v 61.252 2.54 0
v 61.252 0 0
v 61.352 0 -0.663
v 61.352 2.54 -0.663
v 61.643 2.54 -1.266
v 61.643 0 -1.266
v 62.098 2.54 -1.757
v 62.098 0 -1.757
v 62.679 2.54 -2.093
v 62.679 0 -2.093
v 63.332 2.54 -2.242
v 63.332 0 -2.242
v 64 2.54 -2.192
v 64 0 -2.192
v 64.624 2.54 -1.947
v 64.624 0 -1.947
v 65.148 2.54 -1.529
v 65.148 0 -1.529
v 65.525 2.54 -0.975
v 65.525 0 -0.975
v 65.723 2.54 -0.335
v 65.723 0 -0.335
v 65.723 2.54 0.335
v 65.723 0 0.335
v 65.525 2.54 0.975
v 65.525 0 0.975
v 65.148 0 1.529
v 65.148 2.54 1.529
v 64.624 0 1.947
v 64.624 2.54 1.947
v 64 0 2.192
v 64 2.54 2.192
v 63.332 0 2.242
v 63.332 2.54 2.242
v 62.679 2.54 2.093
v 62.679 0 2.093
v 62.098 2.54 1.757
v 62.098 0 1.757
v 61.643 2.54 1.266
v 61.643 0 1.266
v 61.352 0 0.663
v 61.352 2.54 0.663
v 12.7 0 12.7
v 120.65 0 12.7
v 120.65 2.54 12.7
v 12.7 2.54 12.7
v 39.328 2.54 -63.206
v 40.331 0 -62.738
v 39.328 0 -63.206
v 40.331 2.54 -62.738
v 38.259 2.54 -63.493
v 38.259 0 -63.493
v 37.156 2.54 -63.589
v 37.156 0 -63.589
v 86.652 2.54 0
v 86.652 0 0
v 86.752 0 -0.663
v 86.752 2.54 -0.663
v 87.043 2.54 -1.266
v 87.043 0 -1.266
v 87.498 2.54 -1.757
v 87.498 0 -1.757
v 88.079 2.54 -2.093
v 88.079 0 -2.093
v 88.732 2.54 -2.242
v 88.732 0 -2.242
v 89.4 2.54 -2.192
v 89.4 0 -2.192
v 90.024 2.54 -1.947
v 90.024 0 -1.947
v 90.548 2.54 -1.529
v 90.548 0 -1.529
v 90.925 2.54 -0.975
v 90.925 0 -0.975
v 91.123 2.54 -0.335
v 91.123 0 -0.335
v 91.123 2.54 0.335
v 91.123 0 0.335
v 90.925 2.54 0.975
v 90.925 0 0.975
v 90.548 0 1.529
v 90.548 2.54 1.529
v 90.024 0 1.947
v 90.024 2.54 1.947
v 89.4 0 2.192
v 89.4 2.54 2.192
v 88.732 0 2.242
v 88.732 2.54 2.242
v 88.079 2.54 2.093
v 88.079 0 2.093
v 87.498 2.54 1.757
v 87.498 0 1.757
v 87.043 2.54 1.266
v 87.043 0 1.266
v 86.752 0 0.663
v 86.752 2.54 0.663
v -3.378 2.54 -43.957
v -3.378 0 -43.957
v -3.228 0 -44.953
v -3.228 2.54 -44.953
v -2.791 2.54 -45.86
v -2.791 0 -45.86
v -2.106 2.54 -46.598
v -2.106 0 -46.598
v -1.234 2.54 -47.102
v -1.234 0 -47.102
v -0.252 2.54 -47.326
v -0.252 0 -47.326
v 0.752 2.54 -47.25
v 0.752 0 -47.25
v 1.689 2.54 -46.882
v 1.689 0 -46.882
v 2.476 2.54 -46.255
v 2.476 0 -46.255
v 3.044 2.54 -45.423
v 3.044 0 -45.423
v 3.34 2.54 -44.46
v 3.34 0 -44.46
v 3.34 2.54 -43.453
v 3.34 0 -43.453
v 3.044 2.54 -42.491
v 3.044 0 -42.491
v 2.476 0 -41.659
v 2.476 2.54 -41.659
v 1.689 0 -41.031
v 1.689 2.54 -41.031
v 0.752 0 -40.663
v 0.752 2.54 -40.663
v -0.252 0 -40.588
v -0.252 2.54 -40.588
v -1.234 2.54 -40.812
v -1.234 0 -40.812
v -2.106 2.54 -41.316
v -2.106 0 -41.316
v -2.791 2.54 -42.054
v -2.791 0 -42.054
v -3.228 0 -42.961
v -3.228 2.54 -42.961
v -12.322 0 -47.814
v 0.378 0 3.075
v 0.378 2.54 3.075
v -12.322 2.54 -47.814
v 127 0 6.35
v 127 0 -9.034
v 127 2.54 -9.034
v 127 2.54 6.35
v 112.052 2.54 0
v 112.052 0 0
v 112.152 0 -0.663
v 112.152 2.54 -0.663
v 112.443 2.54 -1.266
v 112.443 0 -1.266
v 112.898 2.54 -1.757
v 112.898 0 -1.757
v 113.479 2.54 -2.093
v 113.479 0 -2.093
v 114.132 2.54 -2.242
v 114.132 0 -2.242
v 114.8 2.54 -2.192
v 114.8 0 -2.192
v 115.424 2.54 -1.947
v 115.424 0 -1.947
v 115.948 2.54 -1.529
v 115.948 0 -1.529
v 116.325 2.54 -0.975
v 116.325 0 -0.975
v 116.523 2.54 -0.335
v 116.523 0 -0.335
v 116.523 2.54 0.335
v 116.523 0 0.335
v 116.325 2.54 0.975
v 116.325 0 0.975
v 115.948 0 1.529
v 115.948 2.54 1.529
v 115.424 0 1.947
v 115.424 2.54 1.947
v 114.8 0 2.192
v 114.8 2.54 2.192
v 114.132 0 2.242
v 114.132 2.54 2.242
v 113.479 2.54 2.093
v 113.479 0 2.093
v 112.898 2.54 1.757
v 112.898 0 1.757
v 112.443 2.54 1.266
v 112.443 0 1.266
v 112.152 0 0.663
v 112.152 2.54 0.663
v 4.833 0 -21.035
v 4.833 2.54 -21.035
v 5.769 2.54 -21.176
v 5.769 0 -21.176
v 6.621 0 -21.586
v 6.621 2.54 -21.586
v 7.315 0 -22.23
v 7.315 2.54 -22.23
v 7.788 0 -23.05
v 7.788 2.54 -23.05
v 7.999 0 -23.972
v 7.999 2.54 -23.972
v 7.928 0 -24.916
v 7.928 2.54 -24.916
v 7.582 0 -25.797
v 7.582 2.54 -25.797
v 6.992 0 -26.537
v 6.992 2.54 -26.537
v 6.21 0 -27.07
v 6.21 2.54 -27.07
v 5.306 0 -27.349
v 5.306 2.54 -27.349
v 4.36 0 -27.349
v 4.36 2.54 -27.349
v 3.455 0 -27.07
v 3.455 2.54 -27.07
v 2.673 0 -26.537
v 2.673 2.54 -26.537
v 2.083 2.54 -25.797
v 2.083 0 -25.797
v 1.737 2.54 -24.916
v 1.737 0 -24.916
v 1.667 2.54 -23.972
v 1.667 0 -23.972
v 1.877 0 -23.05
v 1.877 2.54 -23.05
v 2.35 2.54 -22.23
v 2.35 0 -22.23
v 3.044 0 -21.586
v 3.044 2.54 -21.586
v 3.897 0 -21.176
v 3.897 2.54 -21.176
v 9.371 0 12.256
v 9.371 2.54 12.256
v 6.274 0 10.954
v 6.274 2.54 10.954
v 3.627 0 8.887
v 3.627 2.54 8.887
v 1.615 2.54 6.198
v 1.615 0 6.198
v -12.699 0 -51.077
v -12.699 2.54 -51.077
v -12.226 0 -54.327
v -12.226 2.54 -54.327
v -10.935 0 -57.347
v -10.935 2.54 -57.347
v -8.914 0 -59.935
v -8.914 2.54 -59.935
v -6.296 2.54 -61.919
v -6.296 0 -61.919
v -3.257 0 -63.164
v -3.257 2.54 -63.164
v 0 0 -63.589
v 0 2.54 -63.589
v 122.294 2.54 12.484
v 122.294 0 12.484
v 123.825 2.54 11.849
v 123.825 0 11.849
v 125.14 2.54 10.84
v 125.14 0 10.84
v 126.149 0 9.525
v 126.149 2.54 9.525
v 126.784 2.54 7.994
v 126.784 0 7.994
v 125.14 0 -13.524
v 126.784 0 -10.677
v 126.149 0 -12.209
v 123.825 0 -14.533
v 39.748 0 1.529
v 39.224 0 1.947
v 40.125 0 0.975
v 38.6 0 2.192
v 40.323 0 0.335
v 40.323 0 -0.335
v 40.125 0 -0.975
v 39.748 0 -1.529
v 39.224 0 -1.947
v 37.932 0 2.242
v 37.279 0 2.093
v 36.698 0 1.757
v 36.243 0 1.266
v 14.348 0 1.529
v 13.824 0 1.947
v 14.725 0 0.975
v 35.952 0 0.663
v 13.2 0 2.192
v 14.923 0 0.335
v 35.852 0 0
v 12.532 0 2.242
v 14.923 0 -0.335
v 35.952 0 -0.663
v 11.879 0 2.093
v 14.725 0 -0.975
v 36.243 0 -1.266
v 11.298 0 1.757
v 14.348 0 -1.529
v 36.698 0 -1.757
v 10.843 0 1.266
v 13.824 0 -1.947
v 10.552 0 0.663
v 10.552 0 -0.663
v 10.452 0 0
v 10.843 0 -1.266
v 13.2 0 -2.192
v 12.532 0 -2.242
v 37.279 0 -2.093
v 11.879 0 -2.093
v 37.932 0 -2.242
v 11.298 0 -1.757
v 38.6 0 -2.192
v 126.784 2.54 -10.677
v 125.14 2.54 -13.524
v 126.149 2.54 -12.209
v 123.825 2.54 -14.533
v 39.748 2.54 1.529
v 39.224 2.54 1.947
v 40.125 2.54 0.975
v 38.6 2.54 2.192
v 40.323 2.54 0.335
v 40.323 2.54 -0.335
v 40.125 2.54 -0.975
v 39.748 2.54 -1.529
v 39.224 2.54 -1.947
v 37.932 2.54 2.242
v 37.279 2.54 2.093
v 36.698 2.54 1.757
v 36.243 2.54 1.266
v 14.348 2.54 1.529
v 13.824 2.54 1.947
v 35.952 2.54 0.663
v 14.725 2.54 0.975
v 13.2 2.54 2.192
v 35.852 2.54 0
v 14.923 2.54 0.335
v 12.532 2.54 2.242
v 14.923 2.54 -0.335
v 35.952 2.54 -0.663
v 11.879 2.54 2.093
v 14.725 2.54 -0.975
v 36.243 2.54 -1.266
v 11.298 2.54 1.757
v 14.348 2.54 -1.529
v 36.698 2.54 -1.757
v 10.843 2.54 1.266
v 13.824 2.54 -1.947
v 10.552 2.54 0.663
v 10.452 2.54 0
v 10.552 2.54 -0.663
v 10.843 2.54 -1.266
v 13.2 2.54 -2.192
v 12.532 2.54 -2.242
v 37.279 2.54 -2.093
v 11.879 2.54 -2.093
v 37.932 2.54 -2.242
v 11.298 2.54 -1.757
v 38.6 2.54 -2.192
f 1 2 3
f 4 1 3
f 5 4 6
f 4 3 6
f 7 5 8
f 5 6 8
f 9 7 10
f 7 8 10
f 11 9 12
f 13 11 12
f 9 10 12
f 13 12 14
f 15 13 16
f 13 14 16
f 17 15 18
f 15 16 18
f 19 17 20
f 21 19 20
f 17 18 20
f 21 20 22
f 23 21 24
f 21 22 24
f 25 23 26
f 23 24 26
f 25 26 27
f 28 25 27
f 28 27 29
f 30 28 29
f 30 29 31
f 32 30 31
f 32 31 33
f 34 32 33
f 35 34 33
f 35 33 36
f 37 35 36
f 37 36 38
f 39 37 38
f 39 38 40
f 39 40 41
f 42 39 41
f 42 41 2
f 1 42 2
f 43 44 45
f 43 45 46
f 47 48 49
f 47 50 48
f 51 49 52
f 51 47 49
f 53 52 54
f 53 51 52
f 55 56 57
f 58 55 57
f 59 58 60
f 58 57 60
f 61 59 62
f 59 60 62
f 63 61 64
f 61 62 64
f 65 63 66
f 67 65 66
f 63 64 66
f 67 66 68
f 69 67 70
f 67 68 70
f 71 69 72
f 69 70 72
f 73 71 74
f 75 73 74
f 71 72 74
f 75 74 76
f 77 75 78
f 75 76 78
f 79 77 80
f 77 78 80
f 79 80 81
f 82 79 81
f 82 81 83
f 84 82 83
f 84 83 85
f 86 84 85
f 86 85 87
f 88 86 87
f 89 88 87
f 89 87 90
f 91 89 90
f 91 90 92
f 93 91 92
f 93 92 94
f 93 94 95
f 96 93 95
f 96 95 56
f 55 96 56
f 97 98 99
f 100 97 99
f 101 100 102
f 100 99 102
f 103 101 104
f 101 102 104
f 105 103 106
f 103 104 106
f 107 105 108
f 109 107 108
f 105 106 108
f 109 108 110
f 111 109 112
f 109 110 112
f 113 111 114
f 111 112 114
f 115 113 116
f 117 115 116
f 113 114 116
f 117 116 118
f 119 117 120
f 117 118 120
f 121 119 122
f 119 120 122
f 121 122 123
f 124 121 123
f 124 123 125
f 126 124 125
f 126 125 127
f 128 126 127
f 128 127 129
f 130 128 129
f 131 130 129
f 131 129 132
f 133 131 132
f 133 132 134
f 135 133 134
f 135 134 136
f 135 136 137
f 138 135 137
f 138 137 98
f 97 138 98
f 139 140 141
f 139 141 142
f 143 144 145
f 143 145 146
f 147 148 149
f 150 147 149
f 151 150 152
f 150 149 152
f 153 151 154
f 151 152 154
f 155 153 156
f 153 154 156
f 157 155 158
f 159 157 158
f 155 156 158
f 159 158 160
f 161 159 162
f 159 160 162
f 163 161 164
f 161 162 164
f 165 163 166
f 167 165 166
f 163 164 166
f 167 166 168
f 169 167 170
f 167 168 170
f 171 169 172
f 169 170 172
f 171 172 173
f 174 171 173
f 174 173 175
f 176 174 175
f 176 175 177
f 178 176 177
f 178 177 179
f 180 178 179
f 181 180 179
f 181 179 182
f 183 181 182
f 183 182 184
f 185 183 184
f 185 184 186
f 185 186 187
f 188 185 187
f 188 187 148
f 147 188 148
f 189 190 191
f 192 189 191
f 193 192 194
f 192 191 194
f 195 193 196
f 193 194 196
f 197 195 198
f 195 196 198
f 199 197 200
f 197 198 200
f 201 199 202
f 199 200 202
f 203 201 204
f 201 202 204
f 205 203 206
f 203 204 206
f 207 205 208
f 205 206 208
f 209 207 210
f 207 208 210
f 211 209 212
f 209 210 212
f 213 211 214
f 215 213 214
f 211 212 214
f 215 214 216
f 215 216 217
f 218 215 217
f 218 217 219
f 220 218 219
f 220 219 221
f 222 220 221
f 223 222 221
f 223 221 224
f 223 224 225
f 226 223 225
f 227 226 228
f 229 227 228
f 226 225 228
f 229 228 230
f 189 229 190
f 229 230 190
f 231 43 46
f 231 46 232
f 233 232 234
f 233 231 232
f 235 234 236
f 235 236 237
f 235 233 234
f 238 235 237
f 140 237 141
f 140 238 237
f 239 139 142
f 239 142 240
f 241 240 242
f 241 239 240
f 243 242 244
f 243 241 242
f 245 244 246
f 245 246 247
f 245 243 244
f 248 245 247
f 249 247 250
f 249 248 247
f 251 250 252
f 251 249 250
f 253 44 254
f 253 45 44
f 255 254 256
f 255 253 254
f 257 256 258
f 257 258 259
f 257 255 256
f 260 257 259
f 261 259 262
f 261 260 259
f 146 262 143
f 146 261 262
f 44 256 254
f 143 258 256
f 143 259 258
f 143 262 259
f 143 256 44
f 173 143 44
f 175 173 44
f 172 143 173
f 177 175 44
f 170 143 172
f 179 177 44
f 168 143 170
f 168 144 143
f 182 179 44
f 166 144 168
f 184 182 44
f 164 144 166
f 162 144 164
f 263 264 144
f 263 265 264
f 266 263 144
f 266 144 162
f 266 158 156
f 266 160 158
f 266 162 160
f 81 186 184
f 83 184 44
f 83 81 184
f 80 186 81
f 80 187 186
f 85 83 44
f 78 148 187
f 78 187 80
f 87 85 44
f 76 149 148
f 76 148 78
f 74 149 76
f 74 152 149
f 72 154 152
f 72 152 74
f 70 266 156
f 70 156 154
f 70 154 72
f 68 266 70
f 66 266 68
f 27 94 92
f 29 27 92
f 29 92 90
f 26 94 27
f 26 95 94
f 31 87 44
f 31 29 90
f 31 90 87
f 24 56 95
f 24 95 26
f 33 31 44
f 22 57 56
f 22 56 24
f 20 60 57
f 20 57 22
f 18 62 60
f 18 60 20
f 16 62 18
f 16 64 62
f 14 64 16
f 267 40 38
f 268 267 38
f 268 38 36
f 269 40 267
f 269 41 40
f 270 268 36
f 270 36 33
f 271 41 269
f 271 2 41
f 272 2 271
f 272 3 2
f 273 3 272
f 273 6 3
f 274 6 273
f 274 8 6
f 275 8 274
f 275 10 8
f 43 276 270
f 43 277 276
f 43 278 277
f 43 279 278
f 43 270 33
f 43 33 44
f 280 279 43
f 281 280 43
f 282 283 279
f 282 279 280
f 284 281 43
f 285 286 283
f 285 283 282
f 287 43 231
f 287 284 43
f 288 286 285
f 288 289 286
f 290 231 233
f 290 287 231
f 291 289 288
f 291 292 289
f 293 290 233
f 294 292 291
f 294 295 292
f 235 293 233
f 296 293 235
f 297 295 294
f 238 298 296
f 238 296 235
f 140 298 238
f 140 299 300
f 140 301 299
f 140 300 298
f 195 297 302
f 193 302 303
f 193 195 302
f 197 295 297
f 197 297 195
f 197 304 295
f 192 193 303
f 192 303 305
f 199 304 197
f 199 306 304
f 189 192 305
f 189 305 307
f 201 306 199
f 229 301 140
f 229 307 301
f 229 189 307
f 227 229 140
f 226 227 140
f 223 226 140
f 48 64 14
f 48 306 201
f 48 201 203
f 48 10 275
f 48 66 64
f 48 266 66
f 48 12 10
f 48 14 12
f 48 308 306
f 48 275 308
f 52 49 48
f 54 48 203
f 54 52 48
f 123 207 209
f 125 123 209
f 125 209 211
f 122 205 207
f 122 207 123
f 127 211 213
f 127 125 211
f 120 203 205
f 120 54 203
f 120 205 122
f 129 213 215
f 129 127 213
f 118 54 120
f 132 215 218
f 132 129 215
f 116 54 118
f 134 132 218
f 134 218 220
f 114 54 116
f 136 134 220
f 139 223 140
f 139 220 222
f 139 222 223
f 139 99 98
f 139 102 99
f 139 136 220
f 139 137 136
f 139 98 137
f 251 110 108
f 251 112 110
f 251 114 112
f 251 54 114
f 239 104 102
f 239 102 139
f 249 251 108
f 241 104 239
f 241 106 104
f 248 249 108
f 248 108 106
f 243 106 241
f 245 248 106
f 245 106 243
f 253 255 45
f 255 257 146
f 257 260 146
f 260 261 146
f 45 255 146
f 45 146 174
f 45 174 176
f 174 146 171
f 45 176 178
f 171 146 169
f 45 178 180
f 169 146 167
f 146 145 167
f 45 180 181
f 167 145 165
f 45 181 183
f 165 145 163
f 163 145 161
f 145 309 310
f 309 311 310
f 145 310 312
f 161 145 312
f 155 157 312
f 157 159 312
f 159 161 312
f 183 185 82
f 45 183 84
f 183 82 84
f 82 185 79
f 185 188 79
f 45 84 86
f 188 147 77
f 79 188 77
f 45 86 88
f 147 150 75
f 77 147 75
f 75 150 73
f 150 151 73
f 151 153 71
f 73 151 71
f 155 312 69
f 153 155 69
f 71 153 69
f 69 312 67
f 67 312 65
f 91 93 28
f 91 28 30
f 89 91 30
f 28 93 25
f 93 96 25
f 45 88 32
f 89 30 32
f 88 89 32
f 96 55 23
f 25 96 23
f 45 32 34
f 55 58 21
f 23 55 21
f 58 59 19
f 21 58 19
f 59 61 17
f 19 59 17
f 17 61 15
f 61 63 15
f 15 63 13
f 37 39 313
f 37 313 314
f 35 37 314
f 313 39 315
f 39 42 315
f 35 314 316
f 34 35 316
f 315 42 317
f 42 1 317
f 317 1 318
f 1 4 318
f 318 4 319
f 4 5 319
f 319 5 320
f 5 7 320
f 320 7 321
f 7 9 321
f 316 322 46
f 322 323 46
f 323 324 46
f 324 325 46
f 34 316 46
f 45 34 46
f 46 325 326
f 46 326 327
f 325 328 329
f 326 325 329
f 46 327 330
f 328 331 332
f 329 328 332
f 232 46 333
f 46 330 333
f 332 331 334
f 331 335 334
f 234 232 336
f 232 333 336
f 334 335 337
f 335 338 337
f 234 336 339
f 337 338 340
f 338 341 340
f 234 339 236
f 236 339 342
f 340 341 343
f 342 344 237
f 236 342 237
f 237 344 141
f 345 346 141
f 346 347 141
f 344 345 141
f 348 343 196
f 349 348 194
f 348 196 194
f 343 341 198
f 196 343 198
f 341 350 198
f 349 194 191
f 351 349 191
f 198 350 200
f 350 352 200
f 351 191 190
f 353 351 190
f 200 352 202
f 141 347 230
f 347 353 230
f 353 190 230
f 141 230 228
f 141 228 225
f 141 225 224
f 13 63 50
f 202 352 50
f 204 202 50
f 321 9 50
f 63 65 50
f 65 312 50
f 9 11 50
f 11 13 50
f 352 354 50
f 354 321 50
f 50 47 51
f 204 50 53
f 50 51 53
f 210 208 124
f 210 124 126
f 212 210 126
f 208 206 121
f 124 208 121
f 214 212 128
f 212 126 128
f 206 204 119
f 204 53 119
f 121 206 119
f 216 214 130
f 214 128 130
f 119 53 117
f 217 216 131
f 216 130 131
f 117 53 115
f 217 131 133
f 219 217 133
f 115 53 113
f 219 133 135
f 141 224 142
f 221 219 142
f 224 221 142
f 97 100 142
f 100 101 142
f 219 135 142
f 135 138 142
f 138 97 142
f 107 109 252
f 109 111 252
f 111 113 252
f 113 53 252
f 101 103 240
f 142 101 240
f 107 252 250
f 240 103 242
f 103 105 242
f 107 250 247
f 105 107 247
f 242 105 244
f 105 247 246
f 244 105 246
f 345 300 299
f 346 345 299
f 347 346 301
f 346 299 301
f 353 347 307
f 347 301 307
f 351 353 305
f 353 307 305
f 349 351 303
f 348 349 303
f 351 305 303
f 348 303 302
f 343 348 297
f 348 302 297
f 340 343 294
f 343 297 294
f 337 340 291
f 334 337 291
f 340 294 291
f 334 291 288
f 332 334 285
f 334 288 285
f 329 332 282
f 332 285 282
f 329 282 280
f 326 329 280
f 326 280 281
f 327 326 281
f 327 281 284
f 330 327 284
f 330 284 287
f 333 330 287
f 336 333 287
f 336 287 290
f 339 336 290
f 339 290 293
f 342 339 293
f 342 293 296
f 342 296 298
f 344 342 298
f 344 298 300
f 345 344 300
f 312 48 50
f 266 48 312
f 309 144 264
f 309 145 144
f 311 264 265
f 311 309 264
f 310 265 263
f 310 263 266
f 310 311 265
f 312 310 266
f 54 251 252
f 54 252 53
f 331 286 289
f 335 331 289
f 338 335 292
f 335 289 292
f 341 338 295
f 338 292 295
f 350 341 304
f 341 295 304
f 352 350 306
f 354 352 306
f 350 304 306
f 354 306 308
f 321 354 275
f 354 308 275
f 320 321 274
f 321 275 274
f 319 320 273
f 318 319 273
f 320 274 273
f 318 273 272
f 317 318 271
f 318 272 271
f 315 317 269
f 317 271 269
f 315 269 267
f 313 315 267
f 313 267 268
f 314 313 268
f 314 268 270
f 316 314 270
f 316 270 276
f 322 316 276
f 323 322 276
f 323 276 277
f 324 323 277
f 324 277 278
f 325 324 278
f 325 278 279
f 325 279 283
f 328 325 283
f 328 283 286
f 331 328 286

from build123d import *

# Parameters (mm, degrees)
BOSS_EXTRUDE1_DEPTH     = 2.54
F_1_4_CLEARANCE_HOLE1_D = 6.7564
F_8_CLEARANCE_HOLE3_D   = 4.4958
FILLET1_R               = 6.35
SKETCH14_R              = 3.175
CUT_EXTRUDE1_DEPTH      = 2.54


with BuildPart() as part:
    # Sketch1 → Boss-Extrude1 (new body)
    with BuildSketch(Plane(origin=(0, 0, 0), x_dir=(1, 0, 0), z_dir=(0, 1, 0))):
        with BuildLine():
            Line((127, -12.7), (12.7, -12.7))
            ThreePointArc((12.7, -12.7), (4.882201751, -10.008597831), (0.377921481, -3.07512292))
            Line((0.377921481, -3.07512292), (-12.322078519, 47.81402892))
            ThreePointArc((-12.322078519, 47.81402892), (-10.008597831, 58.706950088), (0, 63.58915184))
            Line((0, 63.58915184), (38.85740346, 63.58915184))
            Line((38.85740346, 63.58915184), (127, 12.7))
            Line((127, 12.7), (127, -12.7))
        make_face()
    extrude(amount=BOSS_EXTRUDE1_DEPTH)

    # 1/4 Clearance Hole1 (through all)
    with Locations(Plane(origin=(0, 2.54, 0), x_dir=(1, 0, 0), z_dir=(0, 1, 0))):
        with Locations((0, 43.956848345)):
            Hole(F_1_4_CLEARANCE_HOLE1_D / 2)

    # #8 Clearance Hole3 (through all)
    with Locations(Plane(origin=(0, 2.54, 0), x_dir=(1, 0, 0), z_dir=(0, 1, 0))):
        with Locations((12.7, 0), (38.1, 0), (63.5, 0), (88.9, 0), (114.3, 0)):
            Hole(F_8_CLEARANCE_HOLE3_D / 2)

    # Fillet1
    fillet1_edges = [part.edges().sort_by_distance(p)[0] for p in [
        (127, 1.27, 12.7),
        (38.85740346, 1.27, -63.58915184),
        (127, 1.27, -12.7),
    ]]
    fillet(fillet1_edges, radius=FILLET1_R)

    # Sketch14 → Cut-Extrude1 (cut)
    with BuildSketch(Plane(origin=(0, 2.54, 0), x_dir=(1, 0, 0), z_dir=(0, 1, 0))):
        with Locations(Location((4.83277957, 24.209700029, 0), (0, 0, 270))):
            Circle(SKETCH14_R)
    extrude(amount=-CUT_EXTRUDE1_DEPTH, mode=Mode.SUBTRACT)


solid = part.part
